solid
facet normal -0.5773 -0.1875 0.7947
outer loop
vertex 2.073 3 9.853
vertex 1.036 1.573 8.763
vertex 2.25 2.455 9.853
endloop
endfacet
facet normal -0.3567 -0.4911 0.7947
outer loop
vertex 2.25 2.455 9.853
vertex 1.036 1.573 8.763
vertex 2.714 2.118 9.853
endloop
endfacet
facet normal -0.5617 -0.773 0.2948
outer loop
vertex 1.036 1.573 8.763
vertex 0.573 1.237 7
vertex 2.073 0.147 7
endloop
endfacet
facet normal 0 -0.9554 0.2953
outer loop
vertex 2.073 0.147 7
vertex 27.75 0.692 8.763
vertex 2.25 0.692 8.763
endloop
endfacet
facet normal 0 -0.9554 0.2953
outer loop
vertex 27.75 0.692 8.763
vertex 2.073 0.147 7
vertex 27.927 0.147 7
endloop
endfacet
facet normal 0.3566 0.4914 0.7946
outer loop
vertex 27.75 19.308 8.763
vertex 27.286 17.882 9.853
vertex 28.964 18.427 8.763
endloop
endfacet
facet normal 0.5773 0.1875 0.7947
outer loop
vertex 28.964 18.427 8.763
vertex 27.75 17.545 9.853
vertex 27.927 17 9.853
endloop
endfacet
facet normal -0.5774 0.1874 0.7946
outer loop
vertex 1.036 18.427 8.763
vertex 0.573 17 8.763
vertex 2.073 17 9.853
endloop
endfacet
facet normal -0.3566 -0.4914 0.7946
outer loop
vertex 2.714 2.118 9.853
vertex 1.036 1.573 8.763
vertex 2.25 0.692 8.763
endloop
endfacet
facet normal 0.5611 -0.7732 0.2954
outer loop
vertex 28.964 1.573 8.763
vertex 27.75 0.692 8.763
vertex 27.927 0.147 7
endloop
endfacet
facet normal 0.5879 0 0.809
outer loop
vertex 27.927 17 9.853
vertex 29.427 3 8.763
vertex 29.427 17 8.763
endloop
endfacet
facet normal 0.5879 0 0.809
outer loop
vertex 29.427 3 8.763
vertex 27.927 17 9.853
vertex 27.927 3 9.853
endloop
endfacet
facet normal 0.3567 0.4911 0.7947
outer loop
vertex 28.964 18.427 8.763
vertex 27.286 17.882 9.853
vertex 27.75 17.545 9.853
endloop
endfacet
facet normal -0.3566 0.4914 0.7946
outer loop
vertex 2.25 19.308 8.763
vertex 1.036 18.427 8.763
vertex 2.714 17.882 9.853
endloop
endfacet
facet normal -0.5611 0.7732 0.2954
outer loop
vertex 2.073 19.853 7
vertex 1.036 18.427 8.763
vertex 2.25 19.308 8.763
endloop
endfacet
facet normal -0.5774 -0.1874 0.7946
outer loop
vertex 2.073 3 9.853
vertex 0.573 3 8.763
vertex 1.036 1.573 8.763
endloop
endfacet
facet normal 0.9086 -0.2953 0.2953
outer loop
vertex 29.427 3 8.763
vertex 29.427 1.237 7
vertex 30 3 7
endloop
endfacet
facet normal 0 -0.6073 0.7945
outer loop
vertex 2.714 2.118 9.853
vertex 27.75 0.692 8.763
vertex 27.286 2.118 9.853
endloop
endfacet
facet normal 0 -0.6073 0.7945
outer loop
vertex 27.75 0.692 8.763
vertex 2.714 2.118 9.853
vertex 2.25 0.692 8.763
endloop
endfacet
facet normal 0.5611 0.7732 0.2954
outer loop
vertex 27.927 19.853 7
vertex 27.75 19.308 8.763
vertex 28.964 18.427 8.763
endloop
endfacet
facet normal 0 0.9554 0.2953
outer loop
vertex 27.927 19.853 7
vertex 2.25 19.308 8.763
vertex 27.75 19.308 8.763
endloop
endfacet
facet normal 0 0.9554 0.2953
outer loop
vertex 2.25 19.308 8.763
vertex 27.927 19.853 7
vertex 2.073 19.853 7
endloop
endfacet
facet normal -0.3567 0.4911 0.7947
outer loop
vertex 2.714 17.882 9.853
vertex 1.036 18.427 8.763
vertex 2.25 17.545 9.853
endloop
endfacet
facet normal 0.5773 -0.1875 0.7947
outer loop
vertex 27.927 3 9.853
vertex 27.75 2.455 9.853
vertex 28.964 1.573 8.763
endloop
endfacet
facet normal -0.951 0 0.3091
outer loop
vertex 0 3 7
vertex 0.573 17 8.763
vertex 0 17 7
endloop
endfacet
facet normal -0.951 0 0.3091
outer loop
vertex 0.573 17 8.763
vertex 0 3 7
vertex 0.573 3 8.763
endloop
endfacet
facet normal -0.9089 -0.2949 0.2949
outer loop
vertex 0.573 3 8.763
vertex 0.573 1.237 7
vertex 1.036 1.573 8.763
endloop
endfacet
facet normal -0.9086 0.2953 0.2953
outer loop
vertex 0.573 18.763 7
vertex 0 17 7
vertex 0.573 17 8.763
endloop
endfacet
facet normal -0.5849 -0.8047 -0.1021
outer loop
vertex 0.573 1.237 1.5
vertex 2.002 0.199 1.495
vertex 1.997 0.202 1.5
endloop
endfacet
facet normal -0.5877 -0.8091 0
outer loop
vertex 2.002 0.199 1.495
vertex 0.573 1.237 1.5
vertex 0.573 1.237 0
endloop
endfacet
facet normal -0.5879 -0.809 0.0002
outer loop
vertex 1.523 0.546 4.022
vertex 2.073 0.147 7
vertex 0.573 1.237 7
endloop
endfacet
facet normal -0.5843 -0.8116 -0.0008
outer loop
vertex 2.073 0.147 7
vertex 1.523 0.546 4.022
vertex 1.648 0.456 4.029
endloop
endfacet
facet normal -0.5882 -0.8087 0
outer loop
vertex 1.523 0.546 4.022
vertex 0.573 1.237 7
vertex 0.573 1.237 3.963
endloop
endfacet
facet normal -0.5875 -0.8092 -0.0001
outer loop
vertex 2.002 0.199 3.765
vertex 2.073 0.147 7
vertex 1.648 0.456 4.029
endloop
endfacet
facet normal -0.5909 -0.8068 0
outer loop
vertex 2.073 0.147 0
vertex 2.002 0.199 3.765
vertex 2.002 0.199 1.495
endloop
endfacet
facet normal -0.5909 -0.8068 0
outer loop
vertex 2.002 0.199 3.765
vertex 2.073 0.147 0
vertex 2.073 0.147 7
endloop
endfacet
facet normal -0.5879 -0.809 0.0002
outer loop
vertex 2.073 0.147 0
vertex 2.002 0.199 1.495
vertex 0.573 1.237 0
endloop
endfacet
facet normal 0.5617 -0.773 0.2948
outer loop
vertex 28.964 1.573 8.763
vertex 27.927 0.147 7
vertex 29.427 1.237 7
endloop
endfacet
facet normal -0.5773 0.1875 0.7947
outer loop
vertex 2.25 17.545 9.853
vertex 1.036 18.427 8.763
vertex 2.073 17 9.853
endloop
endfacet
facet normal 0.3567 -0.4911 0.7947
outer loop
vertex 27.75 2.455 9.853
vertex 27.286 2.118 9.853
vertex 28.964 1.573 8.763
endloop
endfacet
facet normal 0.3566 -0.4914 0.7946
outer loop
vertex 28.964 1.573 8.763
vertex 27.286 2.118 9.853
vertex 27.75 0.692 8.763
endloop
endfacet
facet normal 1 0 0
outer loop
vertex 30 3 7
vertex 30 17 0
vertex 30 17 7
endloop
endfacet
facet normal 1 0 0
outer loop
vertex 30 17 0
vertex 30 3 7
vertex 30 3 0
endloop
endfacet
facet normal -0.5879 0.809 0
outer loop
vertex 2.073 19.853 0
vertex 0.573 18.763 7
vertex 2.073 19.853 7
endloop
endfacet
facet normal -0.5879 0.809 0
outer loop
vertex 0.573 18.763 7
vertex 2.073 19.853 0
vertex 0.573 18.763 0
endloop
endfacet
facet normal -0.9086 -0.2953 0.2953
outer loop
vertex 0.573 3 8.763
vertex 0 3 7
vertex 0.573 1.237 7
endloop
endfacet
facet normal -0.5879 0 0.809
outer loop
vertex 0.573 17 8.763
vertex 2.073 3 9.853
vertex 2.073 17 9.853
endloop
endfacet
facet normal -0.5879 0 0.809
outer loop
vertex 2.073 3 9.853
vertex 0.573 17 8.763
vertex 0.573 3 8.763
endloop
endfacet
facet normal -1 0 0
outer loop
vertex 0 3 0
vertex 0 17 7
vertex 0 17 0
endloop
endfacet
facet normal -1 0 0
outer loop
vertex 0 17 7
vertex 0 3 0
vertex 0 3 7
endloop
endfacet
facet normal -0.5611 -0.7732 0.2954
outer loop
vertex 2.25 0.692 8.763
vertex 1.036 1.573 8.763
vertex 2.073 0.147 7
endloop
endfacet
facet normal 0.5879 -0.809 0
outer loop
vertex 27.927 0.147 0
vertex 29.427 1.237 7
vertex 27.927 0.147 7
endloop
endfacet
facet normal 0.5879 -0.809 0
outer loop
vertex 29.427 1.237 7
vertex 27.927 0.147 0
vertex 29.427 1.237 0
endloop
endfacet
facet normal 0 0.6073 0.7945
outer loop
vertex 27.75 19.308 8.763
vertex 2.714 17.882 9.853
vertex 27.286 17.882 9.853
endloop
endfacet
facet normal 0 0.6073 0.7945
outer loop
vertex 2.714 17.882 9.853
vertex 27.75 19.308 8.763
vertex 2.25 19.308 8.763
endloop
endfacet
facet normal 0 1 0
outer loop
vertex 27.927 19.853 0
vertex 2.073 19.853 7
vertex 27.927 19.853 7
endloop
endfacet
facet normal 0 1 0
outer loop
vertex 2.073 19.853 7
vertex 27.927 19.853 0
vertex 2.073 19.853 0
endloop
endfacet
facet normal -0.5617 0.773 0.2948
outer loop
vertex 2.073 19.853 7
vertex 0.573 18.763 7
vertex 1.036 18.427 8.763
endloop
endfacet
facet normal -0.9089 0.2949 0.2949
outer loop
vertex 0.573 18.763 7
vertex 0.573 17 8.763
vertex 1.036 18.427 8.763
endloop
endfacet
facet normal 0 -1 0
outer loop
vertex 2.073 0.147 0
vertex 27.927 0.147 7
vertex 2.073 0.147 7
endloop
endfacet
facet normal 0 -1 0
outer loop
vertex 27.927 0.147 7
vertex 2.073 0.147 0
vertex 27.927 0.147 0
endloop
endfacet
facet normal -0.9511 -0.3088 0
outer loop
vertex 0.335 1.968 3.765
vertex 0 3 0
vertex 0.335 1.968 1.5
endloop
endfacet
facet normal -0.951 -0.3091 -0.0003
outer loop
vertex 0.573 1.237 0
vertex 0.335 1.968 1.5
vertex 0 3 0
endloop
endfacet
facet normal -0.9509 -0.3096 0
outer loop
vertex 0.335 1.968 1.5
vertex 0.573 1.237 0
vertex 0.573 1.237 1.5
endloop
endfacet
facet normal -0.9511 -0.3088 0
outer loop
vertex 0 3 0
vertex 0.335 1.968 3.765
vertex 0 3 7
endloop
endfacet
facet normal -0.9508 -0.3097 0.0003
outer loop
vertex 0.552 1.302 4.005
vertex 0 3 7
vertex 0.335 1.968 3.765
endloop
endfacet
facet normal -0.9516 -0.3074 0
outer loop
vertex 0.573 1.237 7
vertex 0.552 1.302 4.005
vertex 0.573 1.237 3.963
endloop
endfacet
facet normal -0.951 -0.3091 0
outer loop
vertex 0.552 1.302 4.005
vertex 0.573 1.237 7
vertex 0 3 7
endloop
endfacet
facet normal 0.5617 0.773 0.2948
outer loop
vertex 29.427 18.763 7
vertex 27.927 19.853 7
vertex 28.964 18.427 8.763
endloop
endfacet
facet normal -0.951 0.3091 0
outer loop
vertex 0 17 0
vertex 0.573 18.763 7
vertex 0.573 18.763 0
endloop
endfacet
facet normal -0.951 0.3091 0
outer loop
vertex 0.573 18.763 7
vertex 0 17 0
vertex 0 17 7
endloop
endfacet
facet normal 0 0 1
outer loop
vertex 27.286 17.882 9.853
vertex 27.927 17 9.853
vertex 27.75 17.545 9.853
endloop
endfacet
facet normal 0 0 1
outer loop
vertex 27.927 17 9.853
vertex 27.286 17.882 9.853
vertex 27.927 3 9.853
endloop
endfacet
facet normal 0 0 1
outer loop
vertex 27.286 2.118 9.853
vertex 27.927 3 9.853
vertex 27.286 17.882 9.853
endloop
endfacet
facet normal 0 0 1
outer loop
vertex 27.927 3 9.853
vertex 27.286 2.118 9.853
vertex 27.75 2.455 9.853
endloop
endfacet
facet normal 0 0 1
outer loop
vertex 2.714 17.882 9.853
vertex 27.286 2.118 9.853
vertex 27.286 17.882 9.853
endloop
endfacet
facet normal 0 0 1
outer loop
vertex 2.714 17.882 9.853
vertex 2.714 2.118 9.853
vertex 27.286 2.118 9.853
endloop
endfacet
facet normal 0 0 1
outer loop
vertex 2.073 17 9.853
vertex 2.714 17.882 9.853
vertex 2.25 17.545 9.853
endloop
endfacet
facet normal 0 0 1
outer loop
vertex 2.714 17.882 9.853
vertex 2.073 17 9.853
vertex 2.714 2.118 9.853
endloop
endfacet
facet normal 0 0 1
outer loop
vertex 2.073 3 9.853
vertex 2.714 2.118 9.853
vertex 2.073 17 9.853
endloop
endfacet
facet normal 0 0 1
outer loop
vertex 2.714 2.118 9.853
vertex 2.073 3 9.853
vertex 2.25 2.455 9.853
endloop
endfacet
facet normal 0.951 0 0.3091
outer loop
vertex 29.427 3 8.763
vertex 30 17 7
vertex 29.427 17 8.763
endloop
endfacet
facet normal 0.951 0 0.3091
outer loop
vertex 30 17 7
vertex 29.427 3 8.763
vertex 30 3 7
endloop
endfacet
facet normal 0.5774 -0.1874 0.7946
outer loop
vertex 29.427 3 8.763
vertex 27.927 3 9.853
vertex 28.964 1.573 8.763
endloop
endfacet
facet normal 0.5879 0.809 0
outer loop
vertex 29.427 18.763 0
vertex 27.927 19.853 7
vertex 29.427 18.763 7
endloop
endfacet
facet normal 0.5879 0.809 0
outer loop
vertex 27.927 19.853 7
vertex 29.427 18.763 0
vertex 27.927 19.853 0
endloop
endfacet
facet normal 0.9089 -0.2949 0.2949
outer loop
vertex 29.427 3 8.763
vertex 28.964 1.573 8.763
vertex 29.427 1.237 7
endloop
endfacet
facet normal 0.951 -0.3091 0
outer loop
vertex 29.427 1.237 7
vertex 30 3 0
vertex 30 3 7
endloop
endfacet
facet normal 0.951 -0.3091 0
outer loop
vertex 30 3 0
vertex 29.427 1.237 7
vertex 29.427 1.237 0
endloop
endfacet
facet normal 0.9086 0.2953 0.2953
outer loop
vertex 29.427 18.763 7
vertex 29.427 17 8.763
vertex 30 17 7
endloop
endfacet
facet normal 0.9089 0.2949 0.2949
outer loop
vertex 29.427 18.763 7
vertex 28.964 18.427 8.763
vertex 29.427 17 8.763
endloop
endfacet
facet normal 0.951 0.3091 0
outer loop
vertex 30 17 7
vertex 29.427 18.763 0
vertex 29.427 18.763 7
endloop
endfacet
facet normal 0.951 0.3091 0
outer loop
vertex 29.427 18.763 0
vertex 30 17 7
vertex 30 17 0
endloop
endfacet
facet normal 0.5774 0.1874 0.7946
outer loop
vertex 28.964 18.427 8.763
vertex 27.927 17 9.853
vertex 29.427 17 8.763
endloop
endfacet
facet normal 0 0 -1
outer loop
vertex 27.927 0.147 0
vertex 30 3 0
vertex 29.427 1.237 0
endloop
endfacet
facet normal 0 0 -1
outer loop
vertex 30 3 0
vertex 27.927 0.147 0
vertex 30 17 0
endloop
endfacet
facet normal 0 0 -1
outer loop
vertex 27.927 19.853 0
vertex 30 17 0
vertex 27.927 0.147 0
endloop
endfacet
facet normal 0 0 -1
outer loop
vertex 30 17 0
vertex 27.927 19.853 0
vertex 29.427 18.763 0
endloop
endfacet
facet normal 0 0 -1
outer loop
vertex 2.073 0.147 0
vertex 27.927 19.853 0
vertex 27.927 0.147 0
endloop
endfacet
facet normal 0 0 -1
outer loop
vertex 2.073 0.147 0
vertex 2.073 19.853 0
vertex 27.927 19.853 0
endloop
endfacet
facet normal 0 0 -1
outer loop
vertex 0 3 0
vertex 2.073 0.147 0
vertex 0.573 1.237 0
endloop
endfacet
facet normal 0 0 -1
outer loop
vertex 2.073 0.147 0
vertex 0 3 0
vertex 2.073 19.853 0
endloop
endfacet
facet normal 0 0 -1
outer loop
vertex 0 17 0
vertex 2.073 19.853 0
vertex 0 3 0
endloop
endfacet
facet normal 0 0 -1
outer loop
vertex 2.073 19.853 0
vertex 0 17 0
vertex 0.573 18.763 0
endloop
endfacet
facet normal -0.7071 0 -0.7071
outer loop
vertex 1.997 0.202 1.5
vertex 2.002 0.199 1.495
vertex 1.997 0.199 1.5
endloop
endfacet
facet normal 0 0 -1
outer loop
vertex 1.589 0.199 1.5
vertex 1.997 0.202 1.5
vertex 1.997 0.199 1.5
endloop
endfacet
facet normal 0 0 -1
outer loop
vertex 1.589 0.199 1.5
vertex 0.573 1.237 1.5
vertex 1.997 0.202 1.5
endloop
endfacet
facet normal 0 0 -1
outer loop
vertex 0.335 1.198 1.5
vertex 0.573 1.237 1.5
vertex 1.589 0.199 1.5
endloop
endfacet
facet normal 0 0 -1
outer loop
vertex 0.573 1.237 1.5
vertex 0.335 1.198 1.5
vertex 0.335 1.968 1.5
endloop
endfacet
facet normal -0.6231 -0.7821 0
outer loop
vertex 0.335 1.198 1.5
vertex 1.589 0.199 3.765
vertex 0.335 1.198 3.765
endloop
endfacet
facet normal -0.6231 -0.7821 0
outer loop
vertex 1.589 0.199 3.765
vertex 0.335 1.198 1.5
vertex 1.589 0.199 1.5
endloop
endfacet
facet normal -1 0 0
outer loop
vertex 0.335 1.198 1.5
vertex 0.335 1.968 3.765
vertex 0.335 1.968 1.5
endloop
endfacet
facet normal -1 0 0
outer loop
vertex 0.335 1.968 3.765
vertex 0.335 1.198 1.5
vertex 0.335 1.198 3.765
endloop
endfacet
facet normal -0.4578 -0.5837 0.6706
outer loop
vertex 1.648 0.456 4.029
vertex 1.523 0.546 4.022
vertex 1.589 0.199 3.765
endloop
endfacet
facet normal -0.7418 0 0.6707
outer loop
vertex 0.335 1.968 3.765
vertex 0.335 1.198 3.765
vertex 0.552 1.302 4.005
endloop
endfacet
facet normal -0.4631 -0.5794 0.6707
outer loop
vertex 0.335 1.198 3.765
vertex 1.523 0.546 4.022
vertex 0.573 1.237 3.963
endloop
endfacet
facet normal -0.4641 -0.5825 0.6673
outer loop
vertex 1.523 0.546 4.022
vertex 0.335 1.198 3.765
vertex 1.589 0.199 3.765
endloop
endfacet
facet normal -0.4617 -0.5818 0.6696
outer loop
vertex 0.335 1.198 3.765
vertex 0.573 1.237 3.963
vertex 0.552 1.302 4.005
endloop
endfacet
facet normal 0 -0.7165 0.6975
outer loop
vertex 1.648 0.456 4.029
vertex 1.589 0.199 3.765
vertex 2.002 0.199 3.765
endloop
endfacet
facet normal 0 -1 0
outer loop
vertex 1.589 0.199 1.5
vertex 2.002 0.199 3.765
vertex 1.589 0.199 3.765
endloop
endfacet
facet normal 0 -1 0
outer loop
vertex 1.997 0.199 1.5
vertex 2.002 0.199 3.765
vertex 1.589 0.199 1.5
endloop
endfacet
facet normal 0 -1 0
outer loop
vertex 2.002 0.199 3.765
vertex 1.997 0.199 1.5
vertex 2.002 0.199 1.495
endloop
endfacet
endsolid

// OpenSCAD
include <../BOSL/constants.scad>
use <../BOSL/transforms.scad>
include <../OpenSCAD-common-libraries/roundedCube.scad>

base_x_length=60; // Length.
base_y_length=6.2; // Thickness. 
base_z_length=10; // Width.

screw_tab_x_length=12; // at each end. 
rounded_corner_radius=2;

// Motor shaft cut metrics.
cut_height=5.82;
cut_diameter=3; 
cut_depth=1;
cube_offset=(cut_diameter+cut_depth)/2;

module motor_shaft_cut() {
    back((base_y_length-cut_height)/2)
        xrot(90) {
            difference() {
                cylinder(d=5, h=cut_height, center=true, $fn=50);
                back(cube_offset)
                    cube([20, cut_depth, cut_height], center=true);
                fwd(cube_offset)
                    cube([20, cut_depth, cut_height], center=true);
            }
        }
}

module filament_holder() {
    difference() {    
        roundedCube([base_x_length, base_y_length, base_z_length], center=true, r=rounded_corner_radius,
            z=false,
            y=false,
            x=true,
            xcorners=[false, false, true, true]);
        
        screw_mount_x_offset=0; //base_x_length/2-screw_tab_x_length/2; // uncomment to put shaft hole at one end.
        left(screw_mount_x_offset)
            motor_shaft_cut();
    }
}

filament_holder();
